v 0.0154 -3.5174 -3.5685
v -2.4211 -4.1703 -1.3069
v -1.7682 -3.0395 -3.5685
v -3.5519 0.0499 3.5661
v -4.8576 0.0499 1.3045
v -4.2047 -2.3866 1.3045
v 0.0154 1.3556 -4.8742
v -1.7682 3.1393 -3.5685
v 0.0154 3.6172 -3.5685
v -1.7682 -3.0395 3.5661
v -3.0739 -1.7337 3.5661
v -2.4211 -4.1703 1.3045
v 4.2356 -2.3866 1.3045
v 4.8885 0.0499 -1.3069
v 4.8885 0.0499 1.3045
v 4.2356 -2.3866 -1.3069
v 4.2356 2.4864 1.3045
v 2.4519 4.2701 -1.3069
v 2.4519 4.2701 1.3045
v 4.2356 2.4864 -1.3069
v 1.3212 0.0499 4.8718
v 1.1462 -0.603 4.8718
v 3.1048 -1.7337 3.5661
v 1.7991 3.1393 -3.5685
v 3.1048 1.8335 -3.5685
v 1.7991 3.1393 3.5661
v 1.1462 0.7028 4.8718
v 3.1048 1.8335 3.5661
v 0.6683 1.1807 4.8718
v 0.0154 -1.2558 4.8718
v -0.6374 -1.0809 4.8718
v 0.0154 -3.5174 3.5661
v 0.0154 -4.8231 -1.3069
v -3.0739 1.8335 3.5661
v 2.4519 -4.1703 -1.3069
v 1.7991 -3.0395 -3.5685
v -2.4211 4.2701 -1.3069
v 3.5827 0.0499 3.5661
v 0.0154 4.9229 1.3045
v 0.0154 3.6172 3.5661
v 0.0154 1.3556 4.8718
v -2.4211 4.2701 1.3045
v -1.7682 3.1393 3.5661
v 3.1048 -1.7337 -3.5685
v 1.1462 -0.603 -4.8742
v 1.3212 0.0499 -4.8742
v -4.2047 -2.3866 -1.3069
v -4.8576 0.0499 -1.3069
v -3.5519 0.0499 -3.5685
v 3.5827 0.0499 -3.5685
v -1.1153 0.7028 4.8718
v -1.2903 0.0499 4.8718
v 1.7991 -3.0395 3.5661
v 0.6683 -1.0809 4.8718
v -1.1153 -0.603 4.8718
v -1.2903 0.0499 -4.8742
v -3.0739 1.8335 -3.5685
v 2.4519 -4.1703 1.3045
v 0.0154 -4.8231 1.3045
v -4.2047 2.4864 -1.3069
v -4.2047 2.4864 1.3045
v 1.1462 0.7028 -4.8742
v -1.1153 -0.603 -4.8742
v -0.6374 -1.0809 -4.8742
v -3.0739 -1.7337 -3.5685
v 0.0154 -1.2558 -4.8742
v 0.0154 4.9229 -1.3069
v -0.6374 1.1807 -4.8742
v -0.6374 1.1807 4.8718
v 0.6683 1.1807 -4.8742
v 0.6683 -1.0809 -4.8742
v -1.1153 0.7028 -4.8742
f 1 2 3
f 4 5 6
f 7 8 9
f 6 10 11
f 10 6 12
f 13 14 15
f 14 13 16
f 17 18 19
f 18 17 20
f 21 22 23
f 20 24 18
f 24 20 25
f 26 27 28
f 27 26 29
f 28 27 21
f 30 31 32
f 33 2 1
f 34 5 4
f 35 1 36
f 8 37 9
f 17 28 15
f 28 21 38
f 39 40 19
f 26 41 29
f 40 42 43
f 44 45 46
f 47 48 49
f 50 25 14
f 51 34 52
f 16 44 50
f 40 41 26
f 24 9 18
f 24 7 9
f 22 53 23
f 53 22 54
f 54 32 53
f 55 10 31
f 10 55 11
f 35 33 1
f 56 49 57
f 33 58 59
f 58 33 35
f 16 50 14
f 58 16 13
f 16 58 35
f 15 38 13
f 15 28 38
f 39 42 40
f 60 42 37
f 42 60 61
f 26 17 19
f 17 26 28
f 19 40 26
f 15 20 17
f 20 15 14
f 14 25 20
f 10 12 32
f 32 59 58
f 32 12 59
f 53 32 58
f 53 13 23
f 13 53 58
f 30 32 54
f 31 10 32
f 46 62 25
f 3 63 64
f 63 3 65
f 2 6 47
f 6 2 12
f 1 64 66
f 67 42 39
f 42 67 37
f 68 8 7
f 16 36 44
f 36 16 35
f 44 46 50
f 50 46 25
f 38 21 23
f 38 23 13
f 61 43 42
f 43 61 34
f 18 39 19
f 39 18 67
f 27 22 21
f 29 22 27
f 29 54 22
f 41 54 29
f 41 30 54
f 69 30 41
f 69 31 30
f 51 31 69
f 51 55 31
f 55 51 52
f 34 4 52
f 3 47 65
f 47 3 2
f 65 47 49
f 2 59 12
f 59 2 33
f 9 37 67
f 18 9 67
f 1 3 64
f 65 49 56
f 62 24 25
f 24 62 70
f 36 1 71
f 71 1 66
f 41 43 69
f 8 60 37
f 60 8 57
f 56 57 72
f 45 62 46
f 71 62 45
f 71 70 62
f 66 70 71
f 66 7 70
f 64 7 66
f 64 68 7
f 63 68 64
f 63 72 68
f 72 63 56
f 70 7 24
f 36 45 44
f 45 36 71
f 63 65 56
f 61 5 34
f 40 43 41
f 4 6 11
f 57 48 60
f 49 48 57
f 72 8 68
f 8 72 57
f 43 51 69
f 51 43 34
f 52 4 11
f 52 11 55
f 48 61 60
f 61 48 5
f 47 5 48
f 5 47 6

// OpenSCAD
intersection() {
translate([-6.000000, -6.000000, -6.000000])
cube(size = [12.000000, 12.000000, 12.000000], center = false);
union() {
// Begin.
union() {
translate([0.01544, 0.0499, -0.00119])
sphere(r = 5.04492, $fn = 12);

translate([0.01544, 0.0499, -0.00119])
sphere(r = 5.04492, $fn = 12);
}
// End.
}
}
